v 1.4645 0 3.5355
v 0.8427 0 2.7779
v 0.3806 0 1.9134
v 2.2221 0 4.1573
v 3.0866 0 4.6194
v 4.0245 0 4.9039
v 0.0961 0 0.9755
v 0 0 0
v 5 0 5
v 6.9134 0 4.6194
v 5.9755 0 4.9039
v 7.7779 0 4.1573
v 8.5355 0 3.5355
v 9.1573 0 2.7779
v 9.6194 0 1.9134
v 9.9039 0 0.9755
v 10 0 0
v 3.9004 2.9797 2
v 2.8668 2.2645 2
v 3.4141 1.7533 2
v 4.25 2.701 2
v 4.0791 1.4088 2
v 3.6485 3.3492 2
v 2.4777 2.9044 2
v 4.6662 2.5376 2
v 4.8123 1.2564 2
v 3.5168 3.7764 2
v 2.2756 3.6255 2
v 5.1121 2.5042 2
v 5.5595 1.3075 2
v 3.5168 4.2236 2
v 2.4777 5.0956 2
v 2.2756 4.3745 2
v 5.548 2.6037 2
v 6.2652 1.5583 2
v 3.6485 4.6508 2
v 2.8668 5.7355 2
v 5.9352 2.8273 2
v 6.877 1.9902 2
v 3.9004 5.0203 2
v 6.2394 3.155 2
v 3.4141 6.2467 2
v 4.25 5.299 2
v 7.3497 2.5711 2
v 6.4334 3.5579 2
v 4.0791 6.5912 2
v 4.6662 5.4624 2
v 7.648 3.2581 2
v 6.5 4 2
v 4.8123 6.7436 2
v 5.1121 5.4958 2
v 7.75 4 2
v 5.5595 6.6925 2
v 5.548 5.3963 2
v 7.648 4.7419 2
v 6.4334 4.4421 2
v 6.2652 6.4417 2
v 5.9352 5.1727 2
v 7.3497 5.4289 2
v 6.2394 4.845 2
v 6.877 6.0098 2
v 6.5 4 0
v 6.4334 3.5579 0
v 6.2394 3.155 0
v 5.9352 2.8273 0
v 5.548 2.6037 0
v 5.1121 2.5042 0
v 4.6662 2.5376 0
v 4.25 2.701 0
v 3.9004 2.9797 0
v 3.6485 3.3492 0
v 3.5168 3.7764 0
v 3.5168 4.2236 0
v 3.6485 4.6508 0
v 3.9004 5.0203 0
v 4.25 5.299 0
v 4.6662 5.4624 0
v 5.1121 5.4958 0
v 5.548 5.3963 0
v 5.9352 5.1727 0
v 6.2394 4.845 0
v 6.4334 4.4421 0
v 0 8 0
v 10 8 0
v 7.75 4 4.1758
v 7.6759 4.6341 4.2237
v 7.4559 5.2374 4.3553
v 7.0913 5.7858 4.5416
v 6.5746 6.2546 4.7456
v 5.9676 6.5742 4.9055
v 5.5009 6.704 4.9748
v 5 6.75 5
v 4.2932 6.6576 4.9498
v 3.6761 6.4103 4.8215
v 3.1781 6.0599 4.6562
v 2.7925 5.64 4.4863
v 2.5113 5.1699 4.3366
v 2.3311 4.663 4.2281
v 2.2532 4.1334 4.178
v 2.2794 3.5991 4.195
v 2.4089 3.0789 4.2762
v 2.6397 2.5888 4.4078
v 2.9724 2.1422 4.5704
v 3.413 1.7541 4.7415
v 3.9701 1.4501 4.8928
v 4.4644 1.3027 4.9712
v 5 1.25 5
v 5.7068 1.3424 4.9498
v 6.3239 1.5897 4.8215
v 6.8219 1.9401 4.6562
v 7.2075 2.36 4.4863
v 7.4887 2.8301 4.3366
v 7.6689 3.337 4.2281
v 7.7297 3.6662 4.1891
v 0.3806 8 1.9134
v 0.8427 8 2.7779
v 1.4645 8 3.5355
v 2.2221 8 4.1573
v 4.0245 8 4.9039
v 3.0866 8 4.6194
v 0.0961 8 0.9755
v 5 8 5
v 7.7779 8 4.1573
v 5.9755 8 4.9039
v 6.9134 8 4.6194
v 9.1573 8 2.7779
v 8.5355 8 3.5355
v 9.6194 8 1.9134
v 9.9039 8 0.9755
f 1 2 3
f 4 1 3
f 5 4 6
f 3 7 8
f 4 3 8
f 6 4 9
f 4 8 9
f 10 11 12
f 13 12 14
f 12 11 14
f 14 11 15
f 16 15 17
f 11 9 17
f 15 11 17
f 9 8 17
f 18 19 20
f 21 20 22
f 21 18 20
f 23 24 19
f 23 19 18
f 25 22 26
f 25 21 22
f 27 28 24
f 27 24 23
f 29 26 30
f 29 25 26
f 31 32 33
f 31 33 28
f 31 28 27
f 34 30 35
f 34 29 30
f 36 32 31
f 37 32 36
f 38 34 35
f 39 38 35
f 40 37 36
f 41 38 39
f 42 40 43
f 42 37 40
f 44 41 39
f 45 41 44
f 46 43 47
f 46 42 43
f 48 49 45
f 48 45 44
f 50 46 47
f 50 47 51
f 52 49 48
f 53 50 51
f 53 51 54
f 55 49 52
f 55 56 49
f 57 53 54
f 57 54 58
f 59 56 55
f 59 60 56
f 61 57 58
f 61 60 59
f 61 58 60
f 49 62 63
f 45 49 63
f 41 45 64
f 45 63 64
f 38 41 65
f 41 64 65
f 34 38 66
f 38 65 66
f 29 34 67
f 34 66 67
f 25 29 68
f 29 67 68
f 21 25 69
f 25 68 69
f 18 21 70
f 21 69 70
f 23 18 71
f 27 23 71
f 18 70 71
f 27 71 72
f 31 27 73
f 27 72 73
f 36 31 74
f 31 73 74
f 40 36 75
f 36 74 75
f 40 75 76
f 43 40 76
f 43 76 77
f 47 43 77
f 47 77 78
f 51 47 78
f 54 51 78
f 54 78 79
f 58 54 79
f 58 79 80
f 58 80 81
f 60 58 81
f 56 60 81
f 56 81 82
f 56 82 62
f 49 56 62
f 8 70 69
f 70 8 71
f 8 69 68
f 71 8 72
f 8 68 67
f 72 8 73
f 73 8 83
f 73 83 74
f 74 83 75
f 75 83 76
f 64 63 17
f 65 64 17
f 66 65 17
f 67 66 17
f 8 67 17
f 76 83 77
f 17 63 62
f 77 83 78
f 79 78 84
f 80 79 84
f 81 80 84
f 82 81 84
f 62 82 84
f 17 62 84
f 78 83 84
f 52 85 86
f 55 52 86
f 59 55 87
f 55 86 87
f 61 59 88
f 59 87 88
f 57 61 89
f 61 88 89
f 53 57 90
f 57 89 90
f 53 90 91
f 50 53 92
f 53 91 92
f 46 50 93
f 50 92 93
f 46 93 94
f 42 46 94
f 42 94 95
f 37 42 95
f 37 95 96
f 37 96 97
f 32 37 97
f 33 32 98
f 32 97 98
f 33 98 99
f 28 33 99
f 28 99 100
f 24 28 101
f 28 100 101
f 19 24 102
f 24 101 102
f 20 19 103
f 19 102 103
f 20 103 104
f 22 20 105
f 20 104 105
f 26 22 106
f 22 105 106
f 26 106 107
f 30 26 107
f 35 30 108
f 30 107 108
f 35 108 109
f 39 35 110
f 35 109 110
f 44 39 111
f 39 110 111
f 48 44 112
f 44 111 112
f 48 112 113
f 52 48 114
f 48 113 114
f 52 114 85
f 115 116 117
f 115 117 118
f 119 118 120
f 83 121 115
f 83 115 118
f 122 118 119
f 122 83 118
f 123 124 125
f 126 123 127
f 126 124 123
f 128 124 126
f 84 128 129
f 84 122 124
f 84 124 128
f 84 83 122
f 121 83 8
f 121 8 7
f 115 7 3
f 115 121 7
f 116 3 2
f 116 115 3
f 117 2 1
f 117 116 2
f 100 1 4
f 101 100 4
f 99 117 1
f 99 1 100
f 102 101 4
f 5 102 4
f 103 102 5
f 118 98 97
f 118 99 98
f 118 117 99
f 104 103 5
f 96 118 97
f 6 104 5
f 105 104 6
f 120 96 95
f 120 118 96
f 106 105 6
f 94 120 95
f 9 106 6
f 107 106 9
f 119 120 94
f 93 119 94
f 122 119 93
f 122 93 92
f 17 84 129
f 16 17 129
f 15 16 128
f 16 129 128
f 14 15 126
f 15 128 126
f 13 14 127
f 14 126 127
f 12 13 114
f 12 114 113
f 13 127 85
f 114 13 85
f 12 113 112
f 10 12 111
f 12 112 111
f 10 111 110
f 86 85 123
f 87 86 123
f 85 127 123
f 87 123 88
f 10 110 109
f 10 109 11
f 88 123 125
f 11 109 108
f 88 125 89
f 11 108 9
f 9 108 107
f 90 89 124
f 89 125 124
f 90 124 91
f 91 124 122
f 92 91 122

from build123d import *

# Parameters (mm, degrees)
F0_W     = 10
F0_H     = 8
F1_DEPTH = 5
F2_R     = 4.99999
F3_R     = 1.5
F5_DEPTH = 5
F6_R     = 2.75
F7_DEPTH = 3


# Not quite as in the source:
# - a fillet or chamfer is up to 0.001 mm smaller than in the source, because OpenCascade refuses the exact size


with BuildPart() as f1:
    # F0 (on Top) → F1 (new body)
    with BuildSketch(Plane.XY):
        with Locations((5, 4)):
            Rectangle(F0_W, F0_H)
    extrude(amount=F1_DEPTH)

    # F2 (radius 5 in the source; OpenCascade refuses exactly that, so slightly less here)
    f2_edges = [f1.edges().sort_by_distance(p)[0] for p in [
        (0, 4, 5),
        (10, 4, 5),
    ]]
    fillet(f2_edges, radius=F2_R)

    # F3 (on face) → F5 (cut)
    with BuildSketch(Plane(origin=(0, 0, 0), x_dir=(1, 0, 0), z_dir=(0, 0, -1))):
        with Locations((5, -4)):
            Circle(F3_R)
    extrude(amount=-F5_DEPTH, mode=Mode.SUBTRACT)

    # F6 (on offset) → F7 (cut)
    with BuildSketch(Plane.XY.offset(5)):
        with Locations((5, 4)):
            Circle(F6_R)
    extrude(amount=-F7_DEPTH, mode=Mode.SUBTRACT)


solid = f1.part
